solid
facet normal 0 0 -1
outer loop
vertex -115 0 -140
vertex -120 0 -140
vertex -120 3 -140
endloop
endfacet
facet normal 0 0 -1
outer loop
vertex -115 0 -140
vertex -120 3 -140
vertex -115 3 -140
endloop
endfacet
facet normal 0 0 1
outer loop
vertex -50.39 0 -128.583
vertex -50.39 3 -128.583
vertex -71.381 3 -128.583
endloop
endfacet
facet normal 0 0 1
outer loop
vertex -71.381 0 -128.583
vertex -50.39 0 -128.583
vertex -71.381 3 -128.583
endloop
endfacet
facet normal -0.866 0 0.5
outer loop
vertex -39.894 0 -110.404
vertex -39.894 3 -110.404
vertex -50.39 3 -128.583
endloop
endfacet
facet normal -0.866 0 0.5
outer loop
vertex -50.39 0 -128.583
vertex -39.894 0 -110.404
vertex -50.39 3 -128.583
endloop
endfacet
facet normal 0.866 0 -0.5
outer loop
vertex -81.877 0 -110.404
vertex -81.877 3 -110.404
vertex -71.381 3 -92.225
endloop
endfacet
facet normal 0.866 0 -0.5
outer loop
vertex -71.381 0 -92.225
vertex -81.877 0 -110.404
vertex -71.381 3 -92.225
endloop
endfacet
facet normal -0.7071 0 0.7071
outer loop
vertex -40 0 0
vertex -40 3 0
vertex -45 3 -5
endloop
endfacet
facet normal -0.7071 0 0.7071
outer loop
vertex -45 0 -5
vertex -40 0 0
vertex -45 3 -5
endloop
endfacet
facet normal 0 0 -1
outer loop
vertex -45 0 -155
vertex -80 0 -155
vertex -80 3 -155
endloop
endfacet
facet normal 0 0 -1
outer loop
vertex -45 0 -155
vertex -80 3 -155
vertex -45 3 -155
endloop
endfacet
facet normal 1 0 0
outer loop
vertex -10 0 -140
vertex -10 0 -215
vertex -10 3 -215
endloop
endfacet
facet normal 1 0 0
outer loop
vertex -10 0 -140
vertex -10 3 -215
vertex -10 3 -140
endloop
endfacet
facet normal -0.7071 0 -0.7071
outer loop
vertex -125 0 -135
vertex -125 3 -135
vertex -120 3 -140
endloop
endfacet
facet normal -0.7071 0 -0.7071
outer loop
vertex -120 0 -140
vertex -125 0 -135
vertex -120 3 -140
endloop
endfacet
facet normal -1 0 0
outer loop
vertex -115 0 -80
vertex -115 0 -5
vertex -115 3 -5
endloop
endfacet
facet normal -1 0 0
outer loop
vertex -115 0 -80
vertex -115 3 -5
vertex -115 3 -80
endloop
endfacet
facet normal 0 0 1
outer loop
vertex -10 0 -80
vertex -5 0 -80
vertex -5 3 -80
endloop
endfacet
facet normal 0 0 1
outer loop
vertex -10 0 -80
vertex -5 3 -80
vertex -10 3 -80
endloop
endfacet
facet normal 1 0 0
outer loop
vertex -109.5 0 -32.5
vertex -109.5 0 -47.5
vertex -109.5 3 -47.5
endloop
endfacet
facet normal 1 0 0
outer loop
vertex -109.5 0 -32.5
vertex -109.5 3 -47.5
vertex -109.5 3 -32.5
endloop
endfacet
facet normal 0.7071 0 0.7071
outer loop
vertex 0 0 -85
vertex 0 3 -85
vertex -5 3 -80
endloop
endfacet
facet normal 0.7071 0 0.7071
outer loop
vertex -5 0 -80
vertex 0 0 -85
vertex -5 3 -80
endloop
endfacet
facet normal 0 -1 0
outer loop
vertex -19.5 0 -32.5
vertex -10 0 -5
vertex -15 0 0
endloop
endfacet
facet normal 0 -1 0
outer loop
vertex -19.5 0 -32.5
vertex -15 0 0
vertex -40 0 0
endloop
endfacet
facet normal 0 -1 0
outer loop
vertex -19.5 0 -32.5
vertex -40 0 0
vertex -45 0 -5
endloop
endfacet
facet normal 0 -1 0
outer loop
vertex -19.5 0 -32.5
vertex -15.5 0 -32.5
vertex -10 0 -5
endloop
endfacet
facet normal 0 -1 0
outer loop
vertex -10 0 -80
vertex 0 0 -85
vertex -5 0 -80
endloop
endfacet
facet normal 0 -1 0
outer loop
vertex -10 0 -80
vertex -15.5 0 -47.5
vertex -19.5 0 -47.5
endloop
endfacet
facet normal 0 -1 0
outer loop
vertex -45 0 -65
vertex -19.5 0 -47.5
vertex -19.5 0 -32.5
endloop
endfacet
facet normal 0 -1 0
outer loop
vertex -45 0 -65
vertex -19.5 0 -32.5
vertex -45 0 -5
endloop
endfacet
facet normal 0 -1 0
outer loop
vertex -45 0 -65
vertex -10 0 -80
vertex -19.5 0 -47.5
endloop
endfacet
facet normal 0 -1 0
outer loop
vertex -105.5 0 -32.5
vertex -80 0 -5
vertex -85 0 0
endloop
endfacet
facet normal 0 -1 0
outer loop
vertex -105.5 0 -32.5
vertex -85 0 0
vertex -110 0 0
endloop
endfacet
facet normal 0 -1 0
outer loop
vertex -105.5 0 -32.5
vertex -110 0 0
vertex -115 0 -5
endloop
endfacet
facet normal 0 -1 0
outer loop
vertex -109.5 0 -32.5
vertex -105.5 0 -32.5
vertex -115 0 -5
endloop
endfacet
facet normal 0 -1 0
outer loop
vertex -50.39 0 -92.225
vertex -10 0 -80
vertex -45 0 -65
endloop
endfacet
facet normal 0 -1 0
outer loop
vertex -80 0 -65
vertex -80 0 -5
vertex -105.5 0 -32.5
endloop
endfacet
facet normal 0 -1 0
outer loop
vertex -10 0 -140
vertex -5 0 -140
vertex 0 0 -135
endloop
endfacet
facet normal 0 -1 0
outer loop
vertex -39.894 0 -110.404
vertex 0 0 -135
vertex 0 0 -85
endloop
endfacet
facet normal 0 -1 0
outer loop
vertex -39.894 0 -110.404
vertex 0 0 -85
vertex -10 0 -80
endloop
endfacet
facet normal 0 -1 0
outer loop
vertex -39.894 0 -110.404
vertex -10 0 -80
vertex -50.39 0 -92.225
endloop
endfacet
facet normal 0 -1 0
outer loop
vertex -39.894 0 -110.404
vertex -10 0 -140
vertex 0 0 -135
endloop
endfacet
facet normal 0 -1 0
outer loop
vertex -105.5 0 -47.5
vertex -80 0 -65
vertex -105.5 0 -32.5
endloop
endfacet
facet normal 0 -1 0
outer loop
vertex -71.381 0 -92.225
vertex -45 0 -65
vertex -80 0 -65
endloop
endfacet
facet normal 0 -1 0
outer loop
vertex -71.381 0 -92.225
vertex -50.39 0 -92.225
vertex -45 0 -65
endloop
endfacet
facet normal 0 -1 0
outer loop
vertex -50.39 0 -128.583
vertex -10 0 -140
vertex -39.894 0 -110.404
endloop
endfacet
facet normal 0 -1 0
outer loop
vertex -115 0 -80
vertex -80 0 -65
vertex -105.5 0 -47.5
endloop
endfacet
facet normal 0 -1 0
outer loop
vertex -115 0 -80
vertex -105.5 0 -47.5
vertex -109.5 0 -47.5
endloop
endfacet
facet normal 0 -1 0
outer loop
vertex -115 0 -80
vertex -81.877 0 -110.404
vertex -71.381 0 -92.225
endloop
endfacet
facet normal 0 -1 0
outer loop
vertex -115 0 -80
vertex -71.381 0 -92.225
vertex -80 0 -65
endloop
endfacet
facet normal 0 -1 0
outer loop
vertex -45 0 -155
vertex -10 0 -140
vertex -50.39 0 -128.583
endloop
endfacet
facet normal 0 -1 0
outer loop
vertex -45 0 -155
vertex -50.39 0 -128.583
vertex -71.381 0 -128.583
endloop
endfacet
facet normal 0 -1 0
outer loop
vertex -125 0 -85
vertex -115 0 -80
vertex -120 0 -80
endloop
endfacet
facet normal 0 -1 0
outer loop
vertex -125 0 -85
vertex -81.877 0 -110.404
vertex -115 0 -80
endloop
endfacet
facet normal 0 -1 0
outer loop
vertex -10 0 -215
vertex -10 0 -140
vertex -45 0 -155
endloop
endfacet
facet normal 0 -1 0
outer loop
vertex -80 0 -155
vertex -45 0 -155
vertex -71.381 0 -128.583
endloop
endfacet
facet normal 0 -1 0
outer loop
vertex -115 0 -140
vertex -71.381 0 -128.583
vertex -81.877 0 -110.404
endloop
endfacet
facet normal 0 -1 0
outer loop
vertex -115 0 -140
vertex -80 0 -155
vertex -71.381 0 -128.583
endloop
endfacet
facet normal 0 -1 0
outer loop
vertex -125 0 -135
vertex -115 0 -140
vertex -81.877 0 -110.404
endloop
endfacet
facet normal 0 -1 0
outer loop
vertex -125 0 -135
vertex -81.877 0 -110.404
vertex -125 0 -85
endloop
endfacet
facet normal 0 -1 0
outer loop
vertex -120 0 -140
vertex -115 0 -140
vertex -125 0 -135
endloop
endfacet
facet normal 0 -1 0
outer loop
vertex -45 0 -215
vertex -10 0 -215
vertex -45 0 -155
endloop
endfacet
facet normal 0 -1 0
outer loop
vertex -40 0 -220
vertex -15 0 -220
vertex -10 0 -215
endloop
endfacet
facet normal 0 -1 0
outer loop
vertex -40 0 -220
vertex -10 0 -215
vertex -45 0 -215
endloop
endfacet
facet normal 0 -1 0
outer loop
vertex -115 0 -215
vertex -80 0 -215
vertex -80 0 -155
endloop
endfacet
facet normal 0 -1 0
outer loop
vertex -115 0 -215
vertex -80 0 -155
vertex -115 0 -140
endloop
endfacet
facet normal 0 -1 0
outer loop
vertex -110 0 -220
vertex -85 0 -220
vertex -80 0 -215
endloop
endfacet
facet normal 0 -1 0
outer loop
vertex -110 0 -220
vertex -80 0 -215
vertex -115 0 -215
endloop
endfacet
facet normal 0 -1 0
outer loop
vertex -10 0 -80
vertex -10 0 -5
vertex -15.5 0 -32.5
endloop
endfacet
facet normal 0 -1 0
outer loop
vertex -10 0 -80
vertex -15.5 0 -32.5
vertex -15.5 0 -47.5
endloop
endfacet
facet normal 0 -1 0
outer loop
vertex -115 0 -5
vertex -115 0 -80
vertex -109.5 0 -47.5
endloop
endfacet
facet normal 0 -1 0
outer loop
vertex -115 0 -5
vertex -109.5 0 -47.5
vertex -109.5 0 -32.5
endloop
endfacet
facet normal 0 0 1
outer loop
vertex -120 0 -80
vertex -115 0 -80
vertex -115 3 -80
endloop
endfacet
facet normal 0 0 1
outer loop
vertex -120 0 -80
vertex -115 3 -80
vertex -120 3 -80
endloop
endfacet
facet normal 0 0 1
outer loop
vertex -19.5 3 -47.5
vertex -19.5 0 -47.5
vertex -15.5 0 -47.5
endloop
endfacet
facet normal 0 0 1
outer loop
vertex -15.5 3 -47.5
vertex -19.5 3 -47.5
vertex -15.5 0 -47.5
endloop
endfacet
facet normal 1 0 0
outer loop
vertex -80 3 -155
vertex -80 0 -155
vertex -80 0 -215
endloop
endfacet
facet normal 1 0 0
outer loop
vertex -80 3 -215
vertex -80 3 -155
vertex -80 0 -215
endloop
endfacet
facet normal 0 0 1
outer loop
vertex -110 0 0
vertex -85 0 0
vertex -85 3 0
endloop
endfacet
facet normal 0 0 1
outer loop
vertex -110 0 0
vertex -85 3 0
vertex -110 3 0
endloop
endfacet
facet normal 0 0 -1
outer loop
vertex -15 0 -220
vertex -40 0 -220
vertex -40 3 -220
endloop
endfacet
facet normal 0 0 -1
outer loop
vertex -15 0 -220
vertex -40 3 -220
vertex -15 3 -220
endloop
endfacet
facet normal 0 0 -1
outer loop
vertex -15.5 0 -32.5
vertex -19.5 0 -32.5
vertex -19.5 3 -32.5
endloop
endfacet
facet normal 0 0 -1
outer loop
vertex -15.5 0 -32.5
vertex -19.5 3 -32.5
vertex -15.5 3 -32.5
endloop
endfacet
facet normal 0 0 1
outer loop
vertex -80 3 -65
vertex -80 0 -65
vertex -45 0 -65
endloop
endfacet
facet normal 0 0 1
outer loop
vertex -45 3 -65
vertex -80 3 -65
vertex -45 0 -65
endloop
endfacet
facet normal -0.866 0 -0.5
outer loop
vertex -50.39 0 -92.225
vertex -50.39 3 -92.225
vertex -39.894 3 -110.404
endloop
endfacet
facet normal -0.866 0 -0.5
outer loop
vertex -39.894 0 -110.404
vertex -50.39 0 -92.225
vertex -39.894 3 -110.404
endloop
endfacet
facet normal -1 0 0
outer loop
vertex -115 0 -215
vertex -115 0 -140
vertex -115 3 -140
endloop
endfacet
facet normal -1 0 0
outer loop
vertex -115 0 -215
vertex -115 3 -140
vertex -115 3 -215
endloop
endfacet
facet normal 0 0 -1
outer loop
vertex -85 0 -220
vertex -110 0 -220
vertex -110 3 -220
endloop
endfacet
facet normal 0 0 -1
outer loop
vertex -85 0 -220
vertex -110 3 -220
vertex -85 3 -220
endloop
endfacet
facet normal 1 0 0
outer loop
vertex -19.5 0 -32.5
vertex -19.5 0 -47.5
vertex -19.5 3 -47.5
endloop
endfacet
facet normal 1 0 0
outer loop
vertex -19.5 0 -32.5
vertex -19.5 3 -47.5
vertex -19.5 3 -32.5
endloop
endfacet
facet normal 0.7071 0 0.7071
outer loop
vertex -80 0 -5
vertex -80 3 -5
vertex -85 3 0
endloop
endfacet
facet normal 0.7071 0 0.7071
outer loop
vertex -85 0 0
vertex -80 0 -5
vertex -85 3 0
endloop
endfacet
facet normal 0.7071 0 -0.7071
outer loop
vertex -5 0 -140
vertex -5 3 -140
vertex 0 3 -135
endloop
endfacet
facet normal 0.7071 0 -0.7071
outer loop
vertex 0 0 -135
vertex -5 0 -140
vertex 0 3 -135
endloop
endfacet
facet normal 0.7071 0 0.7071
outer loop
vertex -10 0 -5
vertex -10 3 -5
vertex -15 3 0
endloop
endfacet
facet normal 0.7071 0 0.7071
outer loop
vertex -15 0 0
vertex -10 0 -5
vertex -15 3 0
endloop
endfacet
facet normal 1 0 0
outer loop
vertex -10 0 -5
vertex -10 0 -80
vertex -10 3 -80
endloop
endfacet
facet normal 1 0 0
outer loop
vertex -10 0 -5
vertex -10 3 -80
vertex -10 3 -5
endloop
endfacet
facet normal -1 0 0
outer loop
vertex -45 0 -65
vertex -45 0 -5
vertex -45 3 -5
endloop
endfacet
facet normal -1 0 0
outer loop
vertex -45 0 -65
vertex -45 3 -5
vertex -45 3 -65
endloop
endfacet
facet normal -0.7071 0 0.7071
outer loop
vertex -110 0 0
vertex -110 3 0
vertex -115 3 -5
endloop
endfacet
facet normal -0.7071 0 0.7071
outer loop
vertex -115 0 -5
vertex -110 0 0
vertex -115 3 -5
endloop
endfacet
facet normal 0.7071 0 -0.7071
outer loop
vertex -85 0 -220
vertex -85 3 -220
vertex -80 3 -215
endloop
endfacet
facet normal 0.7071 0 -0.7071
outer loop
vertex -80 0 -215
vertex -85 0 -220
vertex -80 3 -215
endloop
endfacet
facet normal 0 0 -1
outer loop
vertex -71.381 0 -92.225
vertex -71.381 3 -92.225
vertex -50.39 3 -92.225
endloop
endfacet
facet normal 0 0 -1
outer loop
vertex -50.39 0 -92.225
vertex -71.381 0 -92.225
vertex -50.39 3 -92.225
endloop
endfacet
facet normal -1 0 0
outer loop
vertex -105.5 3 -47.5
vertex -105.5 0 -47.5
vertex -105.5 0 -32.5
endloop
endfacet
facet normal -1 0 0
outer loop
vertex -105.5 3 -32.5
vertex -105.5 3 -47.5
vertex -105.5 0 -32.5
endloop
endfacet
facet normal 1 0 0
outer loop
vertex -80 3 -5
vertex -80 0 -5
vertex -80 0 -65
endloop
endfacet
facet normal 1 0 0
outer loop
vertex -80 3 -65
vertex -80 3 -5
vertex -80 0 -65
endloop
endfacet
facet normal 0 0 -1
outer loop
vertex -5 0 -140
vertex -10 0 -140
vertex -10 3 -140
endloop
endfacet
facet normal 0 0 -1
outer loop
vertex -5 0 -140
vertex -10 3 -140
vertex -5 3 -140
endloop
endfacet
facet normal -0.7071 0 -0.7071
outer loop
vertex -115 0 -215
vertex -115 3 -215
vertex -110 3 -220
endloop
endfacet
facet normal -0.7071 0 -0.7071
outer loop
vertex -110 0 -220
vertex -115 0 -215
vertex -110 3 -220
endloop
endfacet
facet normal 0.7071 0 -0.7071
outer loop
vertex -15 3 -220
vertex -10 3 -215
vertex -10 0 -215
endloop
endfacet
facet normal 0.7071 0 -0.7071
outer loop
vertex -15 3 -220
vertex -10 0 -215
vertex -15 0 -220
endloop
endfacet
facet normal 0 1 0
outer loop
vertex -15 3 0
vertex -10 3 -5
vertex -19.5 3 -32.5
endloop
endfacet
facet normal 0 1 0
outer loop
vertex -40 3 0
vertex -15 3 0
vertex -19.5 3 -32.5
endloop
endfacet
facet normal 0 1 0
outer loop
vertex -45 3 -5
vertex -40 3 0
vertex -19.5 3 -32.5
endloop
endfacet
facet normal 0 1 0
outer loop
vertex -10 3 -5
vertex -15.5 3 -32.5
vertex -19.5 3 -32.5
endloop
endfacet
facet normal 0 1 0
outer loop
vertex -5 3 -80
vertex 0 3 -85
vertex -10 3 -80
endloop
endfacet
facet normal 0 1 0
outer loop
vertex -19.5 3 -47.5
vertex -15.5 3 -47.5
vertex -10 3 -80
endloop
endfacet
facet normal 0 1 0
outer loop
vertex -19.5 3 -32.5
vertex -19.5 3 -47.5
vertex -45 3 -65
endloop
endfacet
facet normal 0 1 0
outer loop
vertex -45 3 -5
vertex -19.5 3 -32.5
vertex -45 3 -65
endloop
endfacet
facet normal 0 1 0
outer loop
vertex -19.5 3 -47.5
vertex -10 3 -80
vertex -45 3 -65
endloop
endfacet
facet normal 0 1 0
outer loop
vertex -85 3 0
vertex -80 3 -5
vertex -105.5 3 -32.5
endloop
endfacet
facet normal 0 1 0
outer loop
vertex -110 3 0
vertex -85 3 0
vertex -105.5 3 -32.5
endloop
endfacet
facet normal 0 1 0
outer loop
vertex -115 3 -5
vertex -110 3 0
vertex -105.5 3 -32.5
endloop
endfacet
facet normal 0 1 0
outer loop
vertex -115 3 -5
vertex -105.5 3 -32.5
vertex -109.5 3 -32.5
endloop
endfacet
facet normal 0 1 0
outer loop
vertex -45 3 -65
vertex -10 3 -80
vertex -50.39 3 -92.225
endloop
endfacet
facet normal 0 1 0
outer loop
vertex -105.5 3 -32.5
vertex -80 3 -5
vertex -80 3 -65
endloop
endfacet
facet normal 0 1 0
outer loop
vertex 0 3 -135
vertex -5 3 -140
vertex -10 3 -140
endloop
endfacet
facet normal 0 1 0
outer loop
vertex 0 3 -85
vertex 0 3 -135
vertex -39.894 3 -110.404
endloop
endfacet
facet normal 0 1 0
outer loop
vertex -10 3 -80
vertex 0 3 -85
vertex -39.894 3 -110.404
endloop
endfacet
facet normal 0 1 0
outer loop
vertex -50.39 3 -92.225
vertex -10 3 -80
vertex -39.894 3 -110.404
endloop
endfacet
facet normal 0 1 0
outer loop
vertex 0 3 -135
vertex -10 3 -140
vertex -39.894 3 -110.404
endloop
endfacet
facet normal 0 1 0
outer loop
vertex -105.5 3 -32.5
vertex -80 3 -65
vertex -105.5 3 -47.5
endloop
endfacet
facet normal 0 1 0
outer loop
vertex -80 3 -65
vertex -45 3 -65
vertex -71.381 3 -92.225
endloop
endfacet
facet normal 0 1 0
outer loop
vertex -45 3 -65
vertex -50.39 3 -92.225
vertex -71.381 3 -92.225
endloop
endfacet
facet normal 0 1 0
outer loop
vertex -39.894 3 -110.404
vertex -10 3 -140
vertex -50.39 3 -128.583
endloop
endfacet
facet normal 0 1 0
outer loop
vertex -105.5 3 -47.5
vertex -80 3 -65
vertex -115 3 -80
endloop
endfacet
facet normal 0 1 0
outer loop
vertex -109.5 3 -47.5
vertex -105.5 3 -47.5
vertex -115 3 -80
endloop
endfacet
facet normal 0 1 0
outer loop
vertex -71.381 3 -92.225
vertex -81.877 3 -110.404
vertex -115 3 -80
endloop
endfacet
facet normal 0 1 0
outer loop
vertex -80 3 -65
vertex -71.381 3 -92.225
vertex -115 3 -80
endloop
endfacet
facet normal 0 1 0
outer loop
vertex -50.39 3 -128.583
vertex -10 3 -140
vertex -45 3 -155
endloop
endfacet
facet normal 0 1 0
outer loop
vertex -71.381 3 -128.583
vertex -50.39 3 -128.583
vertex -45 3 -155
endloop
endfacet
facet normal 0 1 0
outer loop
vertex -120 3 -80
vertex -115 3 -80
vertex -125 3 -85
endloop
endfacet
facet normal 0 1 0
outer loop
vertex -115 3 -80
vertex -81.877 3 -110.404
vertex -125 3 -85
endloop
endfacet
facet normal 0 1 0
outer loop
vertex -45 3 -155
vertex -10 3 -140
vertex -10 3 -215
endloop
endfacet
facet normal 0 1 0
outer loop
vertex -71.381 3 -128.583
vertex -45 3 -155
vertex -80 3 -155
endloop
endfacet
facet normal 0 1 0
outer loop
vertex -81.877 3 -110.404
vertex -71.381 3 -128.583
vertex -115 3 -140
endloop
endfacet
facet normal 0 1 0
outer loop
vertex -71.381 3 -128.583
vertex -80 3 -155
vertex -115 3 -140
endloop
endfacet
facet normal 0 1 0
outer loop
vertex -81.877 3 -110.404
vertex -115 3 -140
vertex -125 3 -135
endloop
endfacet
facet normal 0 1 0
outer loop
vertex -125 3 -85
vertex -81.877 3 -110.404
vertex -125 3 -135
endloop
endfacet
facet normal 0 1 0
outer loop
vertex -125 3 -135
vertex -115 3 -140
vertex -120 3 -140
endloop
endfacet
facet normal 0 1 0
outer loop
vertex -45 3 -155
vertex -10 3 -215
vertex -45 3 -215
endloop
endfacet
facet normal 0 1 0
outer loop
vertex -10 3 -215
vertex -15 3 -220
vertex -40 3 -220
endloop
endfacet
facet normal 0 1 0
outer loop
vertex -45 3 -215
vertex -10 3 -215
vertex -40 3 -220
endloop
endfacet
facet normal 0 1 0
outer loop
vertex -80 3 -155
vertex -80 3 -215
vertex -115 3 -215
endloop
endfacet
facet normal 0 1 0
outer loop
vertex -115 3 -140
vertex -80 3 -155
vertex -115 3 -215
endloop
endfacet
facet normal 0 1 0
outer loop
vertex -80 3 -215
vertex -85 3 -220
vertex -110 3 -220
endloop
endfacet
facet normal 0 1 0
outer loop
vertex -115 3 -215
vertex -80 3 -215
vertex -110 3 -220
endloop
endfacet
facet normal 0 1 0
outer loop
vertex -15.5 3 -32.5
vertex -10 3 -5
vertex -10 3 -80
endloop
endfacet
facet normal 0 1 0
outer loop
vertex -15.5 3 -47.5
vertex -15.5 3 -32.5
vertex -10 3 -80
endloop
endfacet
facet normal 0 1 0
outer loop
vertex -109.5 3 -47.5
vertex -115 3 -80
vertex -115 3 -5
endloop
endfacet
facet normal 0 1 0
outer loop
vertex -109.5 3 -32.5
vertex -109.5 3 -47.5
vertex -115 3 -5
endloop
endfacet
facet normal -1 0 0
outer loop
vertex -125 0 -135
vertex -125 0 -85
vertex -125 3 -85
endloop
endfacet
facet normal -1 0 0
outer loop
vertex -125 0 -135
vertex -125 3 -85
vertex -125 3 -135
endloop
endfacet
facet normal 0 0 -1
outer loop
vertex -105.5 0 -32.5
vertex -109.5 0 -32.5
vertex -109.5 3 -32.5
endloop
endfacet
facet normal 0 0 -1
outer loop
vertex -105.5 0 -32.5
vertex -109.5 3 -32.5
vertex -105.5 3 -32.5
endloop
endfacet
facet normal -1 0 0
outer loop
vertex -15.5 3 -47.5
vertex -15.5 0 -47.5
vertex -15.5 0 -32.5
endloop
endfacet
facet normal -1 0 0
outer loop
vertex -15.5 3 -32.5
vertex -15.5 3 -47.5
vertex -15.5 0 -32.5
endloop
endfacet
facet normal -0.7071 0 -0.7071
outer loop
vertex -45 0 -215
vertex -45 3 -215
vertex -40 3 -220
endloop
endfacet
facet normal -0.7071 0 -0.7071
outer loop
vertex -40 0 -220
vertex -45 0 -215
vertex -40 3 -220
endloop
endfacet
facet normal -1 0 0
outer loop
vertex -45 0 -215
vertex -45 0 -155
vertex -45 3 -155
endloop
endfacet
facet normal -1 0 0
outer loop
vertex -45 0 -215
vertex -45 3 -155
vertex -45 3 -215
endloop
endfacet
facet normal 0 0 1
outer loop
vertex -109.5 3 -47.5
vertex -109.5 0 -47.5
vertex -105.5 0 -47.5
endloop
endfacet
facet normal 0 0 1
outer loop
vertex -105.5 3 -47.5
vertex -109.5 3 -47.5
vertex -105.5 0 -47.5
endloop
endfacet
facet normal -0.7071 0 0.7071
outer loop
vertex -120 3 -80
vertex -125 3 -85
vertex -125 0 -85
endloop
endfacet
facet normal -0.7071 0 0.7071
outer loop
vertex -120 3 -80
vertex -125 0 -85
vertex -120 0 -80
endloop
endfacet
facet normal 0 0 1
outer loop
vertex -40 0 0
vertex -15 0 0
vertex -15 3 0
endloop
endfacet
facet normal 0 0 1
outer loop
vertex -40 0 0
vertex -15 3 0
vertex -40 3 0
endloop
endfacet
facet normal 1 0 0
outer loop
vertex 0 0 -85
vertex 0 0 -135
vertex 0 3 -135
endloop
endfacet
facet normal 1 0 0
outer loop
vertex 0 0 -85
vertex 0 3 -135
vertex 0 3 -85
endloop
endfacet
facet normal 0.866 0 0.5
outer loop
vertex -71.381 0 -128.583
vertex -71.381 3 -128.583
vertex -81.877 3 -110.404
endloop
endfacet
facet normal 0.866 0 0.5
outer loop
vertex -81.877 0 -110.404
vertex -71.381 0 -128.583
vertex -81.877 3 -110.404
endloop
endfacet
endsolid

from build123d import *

# Parameters (mm, degrees)
BOSS_EXTRUDE1_DEPTH = 3
CUT_EXTRUDE4_START  = -3
SKETCH8_W           = 35
SKETCH8_H           = 65
CUT_EXTRUDE4_DEPTH  = 3
CUT_EXTRUDE5_DEPTH  = 3
CUT_EXTRUDE6_DEPTH  = 3
SKETCH14_W          = 4
SKETCH14_H          = 15
CUT_EXTRUDE7_DEPTH  = 10


with BuildPart() as part:
    # Sketch1 → Boss-Extrude1 (new body)
    with BuildSketch(Plane(origin=(0, 0, 0), x_dir=(1, 0, 0), z_dir=(0, 1, 0))):
        with BuildLine():
            Line((-10, 0), (-115, 0))
            ThreePointArc((-115, 0), (-122.071067812, 2.928932188), (-125, 10))
            Line((-125, 10), (-125, 210))
            ThreePointArc((-125, 210), (-122.071067812, 217.071067812), (-115, 220))
            Line((-115, 220), (-10, 220))
            ThreePointArc((-10, 220), (-2.928932188, 217.071067812), (0, 210))
            Line((0, 210), (0, 10))
            ThreePointArc((0, 10), (-2.928932188, 2.928932188), (-10, 0))
        make_face()
    extrude(amount=BOSS_EXTRUDE1_DEPTH)

    # Sketch8 → Cut-Extrude4 (cut)
    with BuildSketch(Plane(origin=(0, 3, 0), x_dir=(1, 0, 0), z_dir=(0, 1, 0)).offset(CUT_EXTRUDE4_START)):
        with BuildLine():
            Line((-115, 140), (-115, 220))
            ThreePointArc((-115, 220), (-122.071067812, 217.071067812), (-125, 210))
            Line((-125, 210), (-125, 140))
            Line((-125, 140), (-115, 140))
        make_face()
        with Locations((-62.5, 187.5)):
            Rectangle(SKETCH8_W, SKETCH8_H)
        with BuildLine():
            ThreePointArc((0, 210), (-2.928932188, 217.071067812), (-10, 220))
            Line((-10, 220), (-10, 140))
            Line((-10, 140), (0, 140))
            Line((0, 140), (0, 210))
        make_face()
        with BuildLine():
            Line((0, 10), (0, 80))
            Line((0, 80), (-10, 80))
            Line((-10, 80), (-10, 0))
            ThreePointArc((-10, 0), (-2.928932188, 2.928932188), (0, 10))
        make_face()
        with Locations((-62.5, 32.5)):
            Rectangle(SKETCH8_W, SKETCH8_H)
        with BuildLine():
            Line((-115, 80), (-125, 80))
            Line((-125, 80), (-125, 10))
            ThreePointArc((-125, 10), (-122.071067812, 2.928932188), (-115, 0))
            Line((-115, 0), (-115, 80))
        make_face()
    extrude(amount=CUT_EXTRUDE4_DEPTH, mode=Mode.SUBTRACT)

    # Sketch9 → Cut-Extrude5 (cut)
    with BuildSketch(Plane(origin=(0, 3, 0), x_dir=(1, 0, 0), z_dir=(0, 1, 0))):
        Polygon((-81.876757868, 110.403682456), (-71.381014023, 92.224520853), (-50.389526333, 92.224520853), (-39.893782487, 110.403682456), (-50.389526333, 128.582844059), (-71.381014023, 128.582844059), align=None)
    extrude(amount=-CUT_EXTRUDE5_DEPTH, mode=Mode.SUBTRACT)

    # Sketch12 → Cut-Extrude6 (cut)
    with BuildSketch(Plane(origin=(0, 3, 0), x_dir=(1, 0, 0), z_dir=(0, 1, 0))):
        Polygon((-45, 220), (-45, 215), (-40, 220), align=None)
        Polygon((-80, 220), (-85, 220), (-80, 215), align=None)
        Polygon((-115, 215), (-110, 220), (-115, 220), align=None)
        Polygon((0, 140), (-5, 140), (0, 135), align=None)
        Polygon((0, 80), (0, 85), (-5, 80), align=None)
        Polygon((-125, 135), (-120, 140), (-125, 140), align=None)
        Polygon((-110, 0), (-115, 5), (-115, 0), align=None)
        Polygon((-80, 5), (-85, 0), (-80, 0), align=None)
        Polygon((-40, 0), (-45, 5), (-45, 0), align=None)
        Polygon((-10, 0), (-10, 5), (-15, 0), align=None)
        Polygon((-15, 220), (-10, 220), (-10, 215), align=None)
        Polygon((-125, 85), (-120, 80), (-125, 80), align=None)
    extrude(amount=-CUT_EXTRUDE6_DEPTH, mode=Mode.SUBTRACT)

    # Sketch14 → Cut-Extrude7 (cut)
    with BuildSketch(Plane.XZ):
        with Locations((-17.5, -40)):
            Rectangle(SKETCH14_W, SKETCH14_H)
        with Locations((-107.5, -40)):
            Rectangle(SKETCH14_W, SKETCH14_H)
    extrude(amount=-CUT_EXTRUDE7_DEPTH, mode=Mode.SUBTRACT)


solid = part.part
